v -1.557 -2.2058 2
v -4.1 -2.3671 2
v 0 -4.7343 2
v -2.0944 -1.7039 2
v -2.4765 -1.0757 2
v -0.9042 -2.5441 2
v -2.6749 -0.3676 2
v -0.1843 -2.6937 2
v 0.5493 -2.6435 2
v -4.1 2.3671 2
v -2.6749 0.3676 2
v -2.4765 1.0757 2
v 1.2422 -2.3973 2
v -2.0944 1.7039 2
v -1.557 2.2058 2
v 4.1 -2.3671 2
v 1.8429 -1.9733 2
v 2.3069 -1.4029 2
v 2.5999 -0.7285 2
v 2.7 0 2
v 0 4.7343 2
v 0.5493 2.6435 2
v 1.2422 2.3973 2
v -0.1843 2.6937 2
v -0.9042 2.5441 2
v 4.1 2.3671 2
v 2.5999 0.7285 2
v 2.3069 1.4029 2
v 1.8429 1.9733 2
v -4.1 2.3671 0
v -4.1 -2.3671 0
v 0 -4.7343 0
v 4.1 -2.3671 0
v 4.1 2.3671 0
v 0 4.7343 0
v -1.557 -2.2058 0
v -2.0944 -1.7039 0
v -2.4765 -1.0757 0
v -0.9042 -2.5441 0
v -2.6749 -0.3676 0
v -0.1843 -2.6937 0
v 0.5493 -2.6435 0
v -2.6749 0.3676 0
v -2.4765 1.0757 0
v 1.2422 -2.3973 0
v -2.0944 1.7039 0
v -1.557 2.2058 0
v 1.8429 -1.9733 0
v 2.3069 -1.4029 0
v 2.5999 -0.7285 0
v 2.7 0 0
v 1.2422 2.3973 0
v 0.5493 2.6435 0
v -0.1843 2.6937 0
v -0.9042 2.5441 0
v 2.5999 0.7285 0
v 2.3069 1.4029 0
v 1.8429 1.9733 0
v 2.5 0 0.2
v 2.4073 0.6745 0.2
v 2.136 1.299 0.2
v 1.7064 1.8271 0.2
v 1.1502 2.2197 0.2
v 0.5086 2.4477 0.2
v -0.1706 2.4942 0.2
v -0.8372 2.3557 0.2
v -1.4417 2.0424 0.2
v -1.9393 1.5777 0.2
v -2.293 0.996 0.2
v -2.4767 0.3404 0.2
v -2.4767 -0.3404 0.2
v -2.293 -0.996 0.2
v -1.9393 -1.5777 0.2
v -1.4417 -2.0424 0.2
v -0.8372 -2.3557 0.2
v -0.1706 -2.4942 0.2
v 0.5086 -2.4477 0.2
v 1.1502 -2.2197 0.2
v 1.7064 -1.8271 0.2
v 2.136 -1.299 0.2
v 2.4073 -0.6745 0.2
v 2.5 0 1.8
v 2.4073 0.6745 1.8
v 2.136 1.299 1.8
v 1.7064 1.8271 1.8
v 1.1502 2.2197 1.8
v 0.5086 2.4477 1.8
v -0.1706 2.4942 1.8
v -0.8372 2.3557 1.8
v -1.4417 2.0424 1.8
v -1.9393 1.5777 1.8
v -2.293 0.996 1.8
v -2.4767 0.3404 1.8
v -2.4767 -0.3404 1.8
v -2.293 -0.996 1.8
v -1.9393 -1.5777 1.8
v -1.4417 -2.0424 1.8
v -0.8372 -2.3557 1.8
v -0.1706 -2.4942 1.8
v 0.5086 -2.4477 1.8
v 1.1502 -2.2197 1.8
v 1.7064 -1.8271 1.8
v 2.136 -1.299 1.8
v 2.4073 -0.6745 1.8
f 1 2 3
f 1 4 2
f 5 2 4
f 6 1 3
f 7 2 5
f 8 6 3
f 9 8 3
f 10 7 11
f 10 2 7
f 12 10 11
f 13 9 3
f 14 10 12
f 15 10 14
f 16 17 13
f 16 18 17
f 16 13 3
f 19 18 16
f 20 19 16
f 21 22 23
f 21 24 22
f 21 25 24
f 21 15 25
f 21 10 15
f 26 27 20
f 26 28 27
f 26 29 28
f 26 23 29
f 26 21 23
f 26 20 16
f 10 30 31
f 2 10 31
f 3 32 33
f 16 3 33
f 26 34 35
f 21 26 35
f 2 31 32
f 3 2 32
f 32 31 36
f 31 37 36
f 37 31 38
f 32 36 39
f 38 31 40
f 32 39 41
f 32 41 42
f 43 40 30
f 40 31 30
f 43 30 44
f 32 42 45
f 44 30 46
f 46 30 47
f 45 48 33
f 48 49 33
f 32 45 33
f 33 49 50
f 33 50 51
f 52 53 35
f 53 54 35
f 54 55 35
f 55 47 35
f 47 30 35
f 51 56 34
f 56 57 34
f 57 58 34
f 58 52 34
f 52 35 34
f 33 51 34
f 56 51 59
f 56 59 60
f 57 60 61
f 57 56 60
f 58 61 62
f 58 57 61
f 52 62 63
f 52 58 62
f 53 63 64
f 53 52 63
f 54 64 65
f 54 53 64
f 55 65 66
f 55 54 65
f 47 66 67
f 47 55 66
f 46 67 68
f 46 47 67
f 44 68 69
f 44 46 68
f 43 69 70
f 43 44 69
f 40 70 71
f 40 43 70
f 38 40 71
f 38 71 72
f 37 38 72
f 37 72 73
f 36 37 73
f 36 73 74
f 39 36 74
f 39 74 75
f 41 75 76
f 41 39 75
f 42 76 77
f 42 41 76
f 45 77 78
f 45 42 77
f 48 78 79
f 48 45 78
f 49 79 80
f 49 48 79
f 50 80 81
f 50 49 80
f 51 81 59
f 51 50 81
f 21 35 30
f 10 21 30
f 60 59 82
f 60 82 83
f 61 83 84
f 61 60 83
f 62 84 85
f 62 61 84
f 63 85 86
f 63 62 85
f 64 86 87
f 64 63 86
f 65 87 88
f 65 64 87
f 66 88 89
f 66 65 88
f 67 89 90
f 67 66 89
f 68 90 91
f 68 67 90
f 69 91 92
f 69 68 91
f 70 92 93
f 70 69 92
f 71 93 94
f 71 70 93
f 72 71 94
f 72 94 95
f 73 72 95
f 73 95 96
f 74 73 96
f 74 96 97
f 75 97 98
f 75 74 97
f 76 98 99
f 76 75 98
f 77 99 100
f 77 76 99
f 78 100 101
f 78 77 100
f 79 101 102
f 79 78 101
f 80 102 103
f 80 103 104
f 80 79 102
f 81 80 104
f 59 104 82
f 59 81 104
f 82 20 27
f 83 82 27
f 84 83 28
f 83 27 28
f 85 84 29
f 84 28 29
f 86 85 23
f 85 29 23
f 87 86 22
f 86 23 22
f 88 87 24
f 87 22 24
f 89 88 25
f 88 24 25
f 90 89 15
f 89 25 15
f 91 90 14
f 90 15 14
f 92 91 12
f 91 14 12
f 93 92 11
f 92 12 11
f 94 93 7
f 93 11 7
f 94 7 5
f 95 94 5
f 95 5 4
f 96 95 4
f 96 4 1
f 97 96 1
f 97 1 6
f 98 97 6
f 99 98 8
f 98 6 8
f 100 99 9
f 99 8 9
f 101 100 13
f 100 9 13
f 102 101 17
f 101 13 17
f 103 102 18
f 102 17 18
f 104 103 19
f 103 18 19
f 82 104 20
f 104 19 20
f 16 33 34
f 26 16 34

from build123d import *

# Parameters (mm, degrees)
SKETCH1_R           = 2.5
BOSS_EXTRUDE1_DEPTH = 2
CHAMFER1_SIZE       = 0.2


with BuildPart() as part:
    # Sketch1 → Boss-Extrude1 (new body)
    with BuildSketch(Plane.XY):
        Polygon((0, 4.734272207), (-4.1, 2.367136104), (-4.1, -2.367136104), (0, -4.734272207), (4.1, -2.367136104), (4.1, 2.367136104), align=None)
        Circle(SKETCH1_R, mode=Mode.SUBTRACT)
    extrude(amount=BOSS_EXTRUDE1_DEPTH)

    # Chamfer1
    chamfer1_edges = [part.edges().sort_by_distance(p)[0] for p in [
        (-2.5, 0, 0),
        (-2.5, 0, 2),
    ]]
    chamfer(chamfer1_edges, length=CHAMFER1_SIZE)


solid = part.part
